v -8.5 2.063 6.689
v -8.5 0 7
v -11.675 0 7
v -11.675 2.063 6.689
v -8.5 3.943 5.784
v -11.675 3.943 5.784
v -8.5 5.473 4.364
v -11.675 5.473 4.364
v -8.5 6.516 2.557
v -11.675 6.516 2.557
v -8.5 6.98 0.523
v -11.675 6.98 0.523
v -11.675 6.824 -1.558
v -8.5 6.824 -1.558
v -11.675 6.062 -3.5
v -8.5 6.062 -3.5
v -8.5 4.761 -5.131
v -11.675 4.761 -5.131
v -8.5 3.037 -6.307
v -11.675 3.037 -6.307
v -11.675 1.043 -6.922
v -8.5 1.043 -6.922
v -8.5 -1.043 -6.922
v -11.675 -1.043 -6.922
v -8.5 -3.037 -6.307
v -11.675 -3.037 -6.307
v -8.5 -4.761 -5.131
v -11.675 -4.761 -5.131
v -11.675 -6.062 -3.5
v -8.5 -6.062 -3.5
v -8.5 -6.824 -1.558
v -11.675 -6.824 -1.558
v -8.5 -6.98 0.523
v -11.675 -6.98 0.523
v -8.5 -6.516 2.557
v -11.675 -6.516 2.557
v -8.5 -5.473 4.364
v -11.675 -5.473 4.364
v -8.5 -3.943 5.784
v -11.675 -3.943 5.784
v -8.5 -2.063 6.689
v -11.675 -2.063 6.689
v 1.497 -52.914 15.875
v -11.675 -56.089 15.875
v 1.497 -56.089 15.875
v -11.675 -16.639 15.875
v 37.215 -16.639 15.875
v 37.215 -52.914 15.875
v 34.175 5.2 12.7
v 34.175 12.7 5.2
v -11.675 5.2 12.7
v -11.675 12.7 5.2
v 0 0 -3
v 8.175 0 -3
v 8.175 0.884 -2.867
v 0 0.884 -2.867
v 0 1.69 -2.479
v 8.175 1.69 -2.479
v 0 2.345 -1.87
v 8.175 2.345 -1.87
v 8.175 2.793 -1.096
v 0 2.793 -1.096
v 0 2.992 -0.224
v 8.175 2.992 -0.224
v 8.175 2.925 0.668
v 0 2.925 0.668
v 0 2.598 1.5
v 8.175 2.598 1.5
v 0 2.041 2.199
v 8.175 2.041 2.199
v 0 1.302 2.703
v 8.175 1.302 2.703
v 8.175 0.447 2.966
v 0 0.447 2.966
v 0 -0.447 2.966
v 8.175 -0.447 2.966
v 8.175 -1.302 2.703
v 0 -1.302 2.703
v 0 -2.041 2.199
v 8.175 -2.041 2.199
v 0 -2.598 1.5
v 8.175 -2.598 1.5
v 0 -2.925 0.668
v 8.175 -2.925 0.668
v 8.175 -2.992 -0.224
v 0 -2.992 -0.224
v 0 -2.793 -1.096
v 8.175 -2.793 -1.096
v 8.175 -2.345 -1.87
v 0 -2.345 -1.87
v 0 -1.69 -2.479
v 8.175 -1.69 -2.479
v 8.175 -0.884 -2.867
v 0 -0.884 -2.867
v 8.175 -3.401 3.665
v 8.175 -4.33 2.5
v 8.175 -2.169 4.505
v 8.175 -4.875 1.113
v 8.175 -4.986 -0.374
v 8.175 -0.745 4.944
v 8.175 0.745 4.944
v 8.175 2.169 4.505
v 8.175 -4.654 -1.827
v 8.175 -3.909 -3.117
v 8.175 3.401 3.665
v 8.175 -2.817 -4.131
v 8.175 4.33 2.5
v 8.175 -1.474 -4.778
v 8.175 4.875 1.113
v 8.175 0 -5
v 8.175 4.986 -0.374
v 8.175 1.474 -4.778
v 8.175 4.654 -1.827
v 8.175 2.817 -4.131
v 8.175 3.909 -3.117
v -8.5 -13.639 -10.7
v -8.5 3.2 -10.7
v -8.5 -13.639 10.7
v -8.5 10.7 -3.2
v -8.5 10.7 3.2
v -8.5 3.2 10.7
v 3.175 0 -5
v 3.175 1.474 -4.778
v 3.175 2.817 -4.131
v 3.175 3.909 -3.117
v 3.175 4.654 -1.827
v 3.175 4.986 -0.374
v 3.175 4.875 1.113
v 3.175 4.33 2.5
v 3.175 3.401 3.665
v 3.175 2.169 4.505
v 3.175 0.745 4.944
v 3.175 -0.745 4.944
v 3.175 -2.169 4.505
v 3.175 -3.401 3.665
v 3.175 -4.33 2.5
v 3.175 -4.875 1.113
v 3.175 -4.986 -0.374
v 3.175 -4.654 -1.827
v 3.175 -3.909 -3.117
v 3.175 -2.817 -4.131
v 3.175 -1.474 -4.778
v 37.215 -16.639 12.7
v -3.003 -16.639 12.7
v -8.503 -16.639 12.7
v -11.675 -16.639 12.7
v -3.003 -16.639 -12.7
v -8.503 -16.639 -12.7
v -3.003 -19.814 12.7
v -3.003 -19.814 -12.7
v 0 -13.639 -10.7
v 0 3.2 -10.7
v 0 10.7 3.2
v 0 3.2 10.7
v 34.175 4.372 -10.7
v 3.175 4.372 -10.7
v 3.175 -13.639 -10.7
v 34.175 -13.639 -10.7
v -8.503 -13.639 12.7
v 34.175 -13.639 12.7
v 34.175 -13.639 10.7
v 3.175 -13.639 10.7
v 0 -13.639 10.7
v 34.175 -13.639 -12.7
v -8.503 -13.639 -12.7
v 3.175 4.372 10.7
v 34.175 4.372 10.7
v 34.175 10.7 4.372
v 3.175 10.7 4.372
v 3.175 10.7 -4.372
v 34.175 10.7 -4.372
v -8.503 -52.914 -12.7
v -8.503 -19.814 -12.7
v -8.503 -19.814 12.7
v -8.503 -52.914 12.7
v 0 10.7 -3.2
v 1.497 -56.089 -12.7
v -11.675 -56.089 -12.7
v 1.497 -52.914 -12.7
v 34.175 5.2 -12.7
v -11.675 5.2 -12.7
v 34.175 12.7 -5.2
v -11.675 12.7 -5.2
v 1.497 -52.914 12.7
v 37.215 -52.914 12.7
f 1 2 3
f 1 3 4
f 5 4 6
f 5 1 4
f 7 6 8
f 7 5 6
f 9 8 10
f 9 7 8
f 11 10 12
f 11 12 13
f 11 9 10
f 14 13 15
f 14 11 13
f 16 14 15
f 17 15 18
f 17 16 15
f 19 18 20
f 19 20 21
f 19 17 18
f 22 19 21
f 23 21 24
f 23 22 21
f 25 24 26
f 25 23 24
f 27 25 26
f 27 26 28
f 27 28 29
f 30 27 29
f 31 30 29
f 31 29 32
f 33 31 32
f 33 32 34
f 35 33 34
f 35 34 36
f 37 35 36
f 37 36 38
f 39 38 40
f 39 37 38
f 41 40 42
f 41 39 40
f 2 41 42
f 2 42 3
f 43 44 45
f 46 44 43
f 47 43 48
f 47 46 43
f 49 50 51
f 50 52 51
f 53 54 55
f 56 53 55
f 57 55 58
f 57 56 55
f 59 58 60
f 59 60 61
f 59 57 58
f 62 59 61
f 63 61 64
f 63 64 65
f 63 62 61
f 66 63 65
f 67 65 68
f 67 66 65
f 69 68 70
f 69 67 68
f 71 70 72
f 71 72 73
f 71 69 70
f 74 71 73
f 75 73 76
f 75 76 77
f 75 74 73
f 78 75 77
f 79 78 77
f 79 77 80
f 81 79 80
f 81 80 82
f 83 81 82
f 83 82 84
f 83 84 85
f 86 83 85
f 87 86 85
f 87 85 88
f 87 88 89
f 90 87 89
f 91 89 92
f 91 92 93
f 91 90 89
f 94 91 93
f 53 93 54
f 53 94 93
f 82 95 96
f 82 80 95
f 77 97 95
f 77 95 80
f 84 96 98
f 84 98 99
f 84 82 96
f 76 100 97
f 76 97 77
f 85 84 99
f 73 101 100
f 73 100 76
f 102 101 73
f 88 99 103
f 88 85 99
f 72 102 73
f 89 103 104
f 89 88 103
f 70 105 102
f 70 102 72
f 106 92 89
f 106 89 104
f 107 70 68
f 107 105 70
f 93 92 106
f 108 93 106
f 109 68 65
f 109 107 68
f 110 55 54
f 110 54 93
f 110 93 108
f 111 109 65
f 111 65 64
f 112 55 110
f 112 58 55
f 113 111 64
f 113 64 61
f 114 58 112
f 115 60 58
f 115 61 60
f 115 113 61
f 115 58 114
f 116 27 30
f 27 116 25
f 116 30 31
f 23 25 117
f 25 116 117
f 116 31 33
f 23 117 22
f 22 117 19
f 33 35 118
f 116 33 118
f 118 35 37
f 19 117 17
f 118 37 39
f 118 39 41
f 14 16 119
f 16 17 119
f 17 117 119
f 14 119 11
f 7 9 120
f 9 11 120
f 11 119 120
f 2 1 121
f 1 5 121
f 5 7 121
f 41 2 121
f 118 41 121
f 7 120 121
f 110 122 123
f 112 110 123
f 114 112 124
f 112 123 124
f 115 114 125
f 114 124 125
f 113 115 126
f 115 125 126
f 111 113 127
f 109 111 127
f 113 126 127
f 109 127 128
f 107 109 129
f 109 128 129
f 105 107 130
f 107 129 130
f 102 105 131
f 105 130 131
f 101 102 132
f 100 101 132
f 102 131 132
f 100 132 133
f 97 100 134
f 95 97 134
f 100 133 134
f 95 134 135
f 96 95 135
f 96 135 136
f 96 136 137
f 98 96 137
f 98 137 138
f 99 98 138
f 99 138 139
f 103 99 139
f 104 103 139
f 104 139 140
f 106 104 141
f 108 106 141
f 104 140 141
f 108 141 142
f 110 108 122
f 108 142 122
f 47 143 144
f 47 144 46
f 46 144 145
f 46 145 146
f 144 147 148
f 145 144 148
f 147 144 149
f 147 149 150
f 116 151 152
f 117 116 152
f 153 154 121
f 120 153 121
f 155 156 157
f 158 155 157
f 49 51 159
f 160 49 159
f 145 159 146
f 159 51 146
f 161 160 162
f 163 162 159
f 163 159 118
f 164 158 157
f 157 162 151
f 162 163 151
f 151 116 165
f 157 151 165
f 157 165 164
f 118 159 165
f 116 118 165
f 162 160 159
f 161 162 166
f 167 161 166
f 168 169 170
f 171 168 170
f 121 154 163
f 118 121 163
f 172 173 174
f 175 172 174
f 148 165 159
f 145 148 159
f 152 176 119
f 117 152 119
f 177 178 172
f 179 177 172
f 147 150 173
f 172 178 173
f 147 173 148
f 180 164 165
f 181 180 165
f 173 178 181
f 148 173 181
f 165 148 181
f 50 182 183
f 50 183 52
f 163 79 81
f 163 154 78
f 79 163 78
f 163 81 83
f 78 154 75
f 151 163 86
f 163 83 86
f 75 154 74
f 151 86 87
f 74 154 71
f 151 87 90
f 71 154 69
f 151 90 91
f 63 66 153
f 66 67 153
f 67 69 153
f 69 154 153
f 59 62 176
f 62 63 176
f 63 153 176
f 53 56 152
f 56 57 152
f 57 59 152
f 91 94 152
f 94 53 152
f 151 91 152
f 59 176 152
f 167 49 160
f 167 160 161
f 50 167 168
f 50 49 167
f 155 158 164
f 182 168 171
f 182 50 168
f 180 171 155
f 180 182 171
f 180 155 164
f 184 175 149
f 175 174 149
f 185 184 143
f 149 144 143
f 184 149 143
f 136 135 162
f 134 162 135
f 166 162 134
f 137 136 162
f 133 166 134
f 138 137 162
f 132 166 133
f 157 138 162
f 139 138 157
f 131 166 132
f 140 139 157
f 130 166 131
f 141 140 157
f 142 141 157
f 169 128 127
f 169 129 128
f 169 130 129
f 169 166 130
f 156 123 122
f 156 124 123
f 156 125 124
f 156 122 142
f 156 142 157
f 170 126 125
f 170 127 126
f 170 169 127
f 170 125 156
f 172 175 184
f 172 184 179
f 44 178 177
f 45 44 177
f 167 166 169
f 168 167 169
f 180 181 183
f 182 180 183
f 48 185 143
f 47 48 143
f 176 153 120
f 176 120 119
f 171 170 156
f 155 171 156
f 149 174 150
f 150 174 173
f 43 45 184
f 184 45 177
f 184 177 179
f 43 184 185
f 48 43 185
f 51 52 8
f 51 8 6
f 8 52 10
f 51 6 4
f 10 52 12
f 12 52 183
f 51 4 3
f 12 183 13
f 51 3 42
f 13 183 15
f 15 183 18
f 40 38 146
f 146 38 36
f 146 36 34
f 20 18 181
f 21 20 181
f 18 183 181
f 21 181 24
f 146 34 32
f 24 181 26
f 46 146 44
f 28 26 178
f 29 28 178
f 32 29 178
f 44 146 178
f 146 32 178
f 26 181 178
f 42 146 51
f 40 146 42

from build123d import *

# Parameters (mm, degrees)
SKETCH1_R            = 3
BOSS_EXTRUDE1_DEPTH  = 3.175
BOSS_EXTRUDE2_DEPTH  = 8.5
SKETCH3_R            = 7
BOSS_EXTRUDE3_DEPTH  = 3.175
SKETCH4_W            = 3.171981578
SKETCH4_H            = 25.4
BOSS_EXTRUDE4_DEPTH  = 42.45
SKETCH5_R            = 5
SKETCH5_R_2          = 3
BOSS_EXTRUDE5_DEPTH  = 5
CHAMFER2_SIZE        = 7.5
SKETCH7_W            = 25.4
SKETCH7_H            = 3.175
BOSS_EXTRUDE6_DEPTH  = 5.5
SKETCH9_W            = 25.4
SKETCH9_H            = 3.175
BOSS_EXTRUDE7_DEPTH  = 10
BOSS_EXTRUDE8_DEPTH  = 31
BOSS_EXTRUDE11_DEPTH = 3.175


with BuildPart() as part:
    # Sketch1 → Boss-Extrude1 (new body)
    with BuildSketch(Plane(origin=(0, 0, 0), x_dir=(0, 0, -1), z_dir=(1, 0, 0))):
        Polygon((-12.7, 12.7), (-12.7, 0), (-12.7, -13.638521551), (12.7, -13.638521551), (12.7, 0), (12.7, 12.7), align=None)
        Circle(SKETCH1_R, mode=Mode.SUBTRACT)
    extrude(amount=BOSS_EXTRUDE1_DEPTH)

    # Sketch2 → Boss-Extrude2 (add)
    with BuildSketch(Plane.ZY):
        Polygon((-10.7, -11.638521551), (-10.7, -13.638521551), (-12.7, -13.638521551), (-12.7, 12.7), (12.7, 12.7), (12.7, -13.638521551), (10.7, -13.638521551), (10.7, -11.638521551), (10.7, 10.7), (-10.7, 10.7), align=None)
    extrude(amount=BOSS_EXTRUDE2_DEPTH)

    # Sketch3 → Boss-Extrude3 (add)
    with BuildSketch(Plane.ZY.offset(8.5)):
        Polygon((-10.7, -13.638521551), (10.7, -13.638521551), (12.7, -13.638521551), (12.7, 12.7), (-12.7, 12.7), (-12.7, -13.638521551), align=None)
        Circle(SKETCH3_R, mode=Mode.SUBTRACT)
    extrude(amount=BOSS_EXTRUDE3_DEPTH)

    # Sketch4 → Boss-Extrude4 (add)
    with BuildSketch(Plane.XZ.offset(13.638521551)):
        with Locations((-10.089009211, 0)):
            Rectangle(SKETCH4_W, SKETCH4_H)
    extrude(amount=BOSS_EXTRUDE4_DEPTH)

    # Sketch5 → Boss-Extrude5 (add)
    with BuildSketch(Plane(origin=(3.175, 0, 0), x_dir=(0, 0, -1), z_dir=(1, 0, 0))):
        Circle(SKETCH5_R)
        Circle(SKETCH5_R_2, mode=Mode.SUBTRACT)
    extrude(amount=BOSS_EXTRUDE5_DEPTH)

    # Chamfer2
    chamfer2_edges = [part.edges().sort_by_distance(p)[0] for p in [
        (-4.25, 12.7, 12.7),
        (-4.25, 12.7, -12.7),
        (-4.25, 10.7, -10.7),
        (-4.25, 10.7, 10.7),
    ]]
    chamfer(chamfer2_edges, length=CHAMFER2_SIZE)

    # Sketch7 → Boss-Extrude6 (add)
    with BuildSketch(Plane(origin=(-8.503018422, 0, 0), x_dir=(0, 0, -1), z_dir=(1, 0, 0))):
        with Locations((0, -18.226021551)):
            Rectangle(SKETCH7_W, SKETCH7_H)
    extrude(amount=BOSS_EXTRUDE6_DEPTH)

    # Sketch9 → Boss-Extrude7 (add)
    with BuildSketch(Plane(origin=(-8.503018422, 0, 0), x_dir=(0, 0, -1), z_dir=(1, 0, 0))):
        with Locations((0, -54.501021551)):
            Rectangle(SKETCH9_W, SKETCH9_H)
    extrude(amount=BOSS_EXTRUDE7_DEPTH)

    # Sketch10 → Boss-Extrude8 (add)
    with BuildSketch(Plane(origin=(3.175, 0, 0), x_dir=(0, 0, -1), z_dir=(1, 0, 0))):
        Polygon((5.2, 12.7), (-5.2, 12.7), (-12.7, 5.2), (-12.7, -13.638521551), (-10.7, -13.638521551), (-10.7, -11.638521551), (-10.7, 4.371572875), (-4.371572875, 10.7), (4.371572875, 10.7), (10.7, 4.371572875), (10.7, -11.638521551), (10.7, -13.638521551), (12.7, -13.638521551), (12.7, 5.2), align=None)
    extrude(amount=BOSS_EXTRUDE8_DEPTH)

    # Sketch12 → Boss-Extrude11 (add)
    with BuildSketch(Plane.XY.offset(12.7)):
        Polygon((-11.675, -52.913521551), (-11.675, -56.088521551), (1.496981578, -56.088521551), (1.496981578, -52.913521551), (37.215, -52.913521551), (37.215, -16.638521551), (-11.675, -16.638521551), align=None)
    extrude(amount=BOSS_EXTRUDE11_DEPTH)


solid = part.part
